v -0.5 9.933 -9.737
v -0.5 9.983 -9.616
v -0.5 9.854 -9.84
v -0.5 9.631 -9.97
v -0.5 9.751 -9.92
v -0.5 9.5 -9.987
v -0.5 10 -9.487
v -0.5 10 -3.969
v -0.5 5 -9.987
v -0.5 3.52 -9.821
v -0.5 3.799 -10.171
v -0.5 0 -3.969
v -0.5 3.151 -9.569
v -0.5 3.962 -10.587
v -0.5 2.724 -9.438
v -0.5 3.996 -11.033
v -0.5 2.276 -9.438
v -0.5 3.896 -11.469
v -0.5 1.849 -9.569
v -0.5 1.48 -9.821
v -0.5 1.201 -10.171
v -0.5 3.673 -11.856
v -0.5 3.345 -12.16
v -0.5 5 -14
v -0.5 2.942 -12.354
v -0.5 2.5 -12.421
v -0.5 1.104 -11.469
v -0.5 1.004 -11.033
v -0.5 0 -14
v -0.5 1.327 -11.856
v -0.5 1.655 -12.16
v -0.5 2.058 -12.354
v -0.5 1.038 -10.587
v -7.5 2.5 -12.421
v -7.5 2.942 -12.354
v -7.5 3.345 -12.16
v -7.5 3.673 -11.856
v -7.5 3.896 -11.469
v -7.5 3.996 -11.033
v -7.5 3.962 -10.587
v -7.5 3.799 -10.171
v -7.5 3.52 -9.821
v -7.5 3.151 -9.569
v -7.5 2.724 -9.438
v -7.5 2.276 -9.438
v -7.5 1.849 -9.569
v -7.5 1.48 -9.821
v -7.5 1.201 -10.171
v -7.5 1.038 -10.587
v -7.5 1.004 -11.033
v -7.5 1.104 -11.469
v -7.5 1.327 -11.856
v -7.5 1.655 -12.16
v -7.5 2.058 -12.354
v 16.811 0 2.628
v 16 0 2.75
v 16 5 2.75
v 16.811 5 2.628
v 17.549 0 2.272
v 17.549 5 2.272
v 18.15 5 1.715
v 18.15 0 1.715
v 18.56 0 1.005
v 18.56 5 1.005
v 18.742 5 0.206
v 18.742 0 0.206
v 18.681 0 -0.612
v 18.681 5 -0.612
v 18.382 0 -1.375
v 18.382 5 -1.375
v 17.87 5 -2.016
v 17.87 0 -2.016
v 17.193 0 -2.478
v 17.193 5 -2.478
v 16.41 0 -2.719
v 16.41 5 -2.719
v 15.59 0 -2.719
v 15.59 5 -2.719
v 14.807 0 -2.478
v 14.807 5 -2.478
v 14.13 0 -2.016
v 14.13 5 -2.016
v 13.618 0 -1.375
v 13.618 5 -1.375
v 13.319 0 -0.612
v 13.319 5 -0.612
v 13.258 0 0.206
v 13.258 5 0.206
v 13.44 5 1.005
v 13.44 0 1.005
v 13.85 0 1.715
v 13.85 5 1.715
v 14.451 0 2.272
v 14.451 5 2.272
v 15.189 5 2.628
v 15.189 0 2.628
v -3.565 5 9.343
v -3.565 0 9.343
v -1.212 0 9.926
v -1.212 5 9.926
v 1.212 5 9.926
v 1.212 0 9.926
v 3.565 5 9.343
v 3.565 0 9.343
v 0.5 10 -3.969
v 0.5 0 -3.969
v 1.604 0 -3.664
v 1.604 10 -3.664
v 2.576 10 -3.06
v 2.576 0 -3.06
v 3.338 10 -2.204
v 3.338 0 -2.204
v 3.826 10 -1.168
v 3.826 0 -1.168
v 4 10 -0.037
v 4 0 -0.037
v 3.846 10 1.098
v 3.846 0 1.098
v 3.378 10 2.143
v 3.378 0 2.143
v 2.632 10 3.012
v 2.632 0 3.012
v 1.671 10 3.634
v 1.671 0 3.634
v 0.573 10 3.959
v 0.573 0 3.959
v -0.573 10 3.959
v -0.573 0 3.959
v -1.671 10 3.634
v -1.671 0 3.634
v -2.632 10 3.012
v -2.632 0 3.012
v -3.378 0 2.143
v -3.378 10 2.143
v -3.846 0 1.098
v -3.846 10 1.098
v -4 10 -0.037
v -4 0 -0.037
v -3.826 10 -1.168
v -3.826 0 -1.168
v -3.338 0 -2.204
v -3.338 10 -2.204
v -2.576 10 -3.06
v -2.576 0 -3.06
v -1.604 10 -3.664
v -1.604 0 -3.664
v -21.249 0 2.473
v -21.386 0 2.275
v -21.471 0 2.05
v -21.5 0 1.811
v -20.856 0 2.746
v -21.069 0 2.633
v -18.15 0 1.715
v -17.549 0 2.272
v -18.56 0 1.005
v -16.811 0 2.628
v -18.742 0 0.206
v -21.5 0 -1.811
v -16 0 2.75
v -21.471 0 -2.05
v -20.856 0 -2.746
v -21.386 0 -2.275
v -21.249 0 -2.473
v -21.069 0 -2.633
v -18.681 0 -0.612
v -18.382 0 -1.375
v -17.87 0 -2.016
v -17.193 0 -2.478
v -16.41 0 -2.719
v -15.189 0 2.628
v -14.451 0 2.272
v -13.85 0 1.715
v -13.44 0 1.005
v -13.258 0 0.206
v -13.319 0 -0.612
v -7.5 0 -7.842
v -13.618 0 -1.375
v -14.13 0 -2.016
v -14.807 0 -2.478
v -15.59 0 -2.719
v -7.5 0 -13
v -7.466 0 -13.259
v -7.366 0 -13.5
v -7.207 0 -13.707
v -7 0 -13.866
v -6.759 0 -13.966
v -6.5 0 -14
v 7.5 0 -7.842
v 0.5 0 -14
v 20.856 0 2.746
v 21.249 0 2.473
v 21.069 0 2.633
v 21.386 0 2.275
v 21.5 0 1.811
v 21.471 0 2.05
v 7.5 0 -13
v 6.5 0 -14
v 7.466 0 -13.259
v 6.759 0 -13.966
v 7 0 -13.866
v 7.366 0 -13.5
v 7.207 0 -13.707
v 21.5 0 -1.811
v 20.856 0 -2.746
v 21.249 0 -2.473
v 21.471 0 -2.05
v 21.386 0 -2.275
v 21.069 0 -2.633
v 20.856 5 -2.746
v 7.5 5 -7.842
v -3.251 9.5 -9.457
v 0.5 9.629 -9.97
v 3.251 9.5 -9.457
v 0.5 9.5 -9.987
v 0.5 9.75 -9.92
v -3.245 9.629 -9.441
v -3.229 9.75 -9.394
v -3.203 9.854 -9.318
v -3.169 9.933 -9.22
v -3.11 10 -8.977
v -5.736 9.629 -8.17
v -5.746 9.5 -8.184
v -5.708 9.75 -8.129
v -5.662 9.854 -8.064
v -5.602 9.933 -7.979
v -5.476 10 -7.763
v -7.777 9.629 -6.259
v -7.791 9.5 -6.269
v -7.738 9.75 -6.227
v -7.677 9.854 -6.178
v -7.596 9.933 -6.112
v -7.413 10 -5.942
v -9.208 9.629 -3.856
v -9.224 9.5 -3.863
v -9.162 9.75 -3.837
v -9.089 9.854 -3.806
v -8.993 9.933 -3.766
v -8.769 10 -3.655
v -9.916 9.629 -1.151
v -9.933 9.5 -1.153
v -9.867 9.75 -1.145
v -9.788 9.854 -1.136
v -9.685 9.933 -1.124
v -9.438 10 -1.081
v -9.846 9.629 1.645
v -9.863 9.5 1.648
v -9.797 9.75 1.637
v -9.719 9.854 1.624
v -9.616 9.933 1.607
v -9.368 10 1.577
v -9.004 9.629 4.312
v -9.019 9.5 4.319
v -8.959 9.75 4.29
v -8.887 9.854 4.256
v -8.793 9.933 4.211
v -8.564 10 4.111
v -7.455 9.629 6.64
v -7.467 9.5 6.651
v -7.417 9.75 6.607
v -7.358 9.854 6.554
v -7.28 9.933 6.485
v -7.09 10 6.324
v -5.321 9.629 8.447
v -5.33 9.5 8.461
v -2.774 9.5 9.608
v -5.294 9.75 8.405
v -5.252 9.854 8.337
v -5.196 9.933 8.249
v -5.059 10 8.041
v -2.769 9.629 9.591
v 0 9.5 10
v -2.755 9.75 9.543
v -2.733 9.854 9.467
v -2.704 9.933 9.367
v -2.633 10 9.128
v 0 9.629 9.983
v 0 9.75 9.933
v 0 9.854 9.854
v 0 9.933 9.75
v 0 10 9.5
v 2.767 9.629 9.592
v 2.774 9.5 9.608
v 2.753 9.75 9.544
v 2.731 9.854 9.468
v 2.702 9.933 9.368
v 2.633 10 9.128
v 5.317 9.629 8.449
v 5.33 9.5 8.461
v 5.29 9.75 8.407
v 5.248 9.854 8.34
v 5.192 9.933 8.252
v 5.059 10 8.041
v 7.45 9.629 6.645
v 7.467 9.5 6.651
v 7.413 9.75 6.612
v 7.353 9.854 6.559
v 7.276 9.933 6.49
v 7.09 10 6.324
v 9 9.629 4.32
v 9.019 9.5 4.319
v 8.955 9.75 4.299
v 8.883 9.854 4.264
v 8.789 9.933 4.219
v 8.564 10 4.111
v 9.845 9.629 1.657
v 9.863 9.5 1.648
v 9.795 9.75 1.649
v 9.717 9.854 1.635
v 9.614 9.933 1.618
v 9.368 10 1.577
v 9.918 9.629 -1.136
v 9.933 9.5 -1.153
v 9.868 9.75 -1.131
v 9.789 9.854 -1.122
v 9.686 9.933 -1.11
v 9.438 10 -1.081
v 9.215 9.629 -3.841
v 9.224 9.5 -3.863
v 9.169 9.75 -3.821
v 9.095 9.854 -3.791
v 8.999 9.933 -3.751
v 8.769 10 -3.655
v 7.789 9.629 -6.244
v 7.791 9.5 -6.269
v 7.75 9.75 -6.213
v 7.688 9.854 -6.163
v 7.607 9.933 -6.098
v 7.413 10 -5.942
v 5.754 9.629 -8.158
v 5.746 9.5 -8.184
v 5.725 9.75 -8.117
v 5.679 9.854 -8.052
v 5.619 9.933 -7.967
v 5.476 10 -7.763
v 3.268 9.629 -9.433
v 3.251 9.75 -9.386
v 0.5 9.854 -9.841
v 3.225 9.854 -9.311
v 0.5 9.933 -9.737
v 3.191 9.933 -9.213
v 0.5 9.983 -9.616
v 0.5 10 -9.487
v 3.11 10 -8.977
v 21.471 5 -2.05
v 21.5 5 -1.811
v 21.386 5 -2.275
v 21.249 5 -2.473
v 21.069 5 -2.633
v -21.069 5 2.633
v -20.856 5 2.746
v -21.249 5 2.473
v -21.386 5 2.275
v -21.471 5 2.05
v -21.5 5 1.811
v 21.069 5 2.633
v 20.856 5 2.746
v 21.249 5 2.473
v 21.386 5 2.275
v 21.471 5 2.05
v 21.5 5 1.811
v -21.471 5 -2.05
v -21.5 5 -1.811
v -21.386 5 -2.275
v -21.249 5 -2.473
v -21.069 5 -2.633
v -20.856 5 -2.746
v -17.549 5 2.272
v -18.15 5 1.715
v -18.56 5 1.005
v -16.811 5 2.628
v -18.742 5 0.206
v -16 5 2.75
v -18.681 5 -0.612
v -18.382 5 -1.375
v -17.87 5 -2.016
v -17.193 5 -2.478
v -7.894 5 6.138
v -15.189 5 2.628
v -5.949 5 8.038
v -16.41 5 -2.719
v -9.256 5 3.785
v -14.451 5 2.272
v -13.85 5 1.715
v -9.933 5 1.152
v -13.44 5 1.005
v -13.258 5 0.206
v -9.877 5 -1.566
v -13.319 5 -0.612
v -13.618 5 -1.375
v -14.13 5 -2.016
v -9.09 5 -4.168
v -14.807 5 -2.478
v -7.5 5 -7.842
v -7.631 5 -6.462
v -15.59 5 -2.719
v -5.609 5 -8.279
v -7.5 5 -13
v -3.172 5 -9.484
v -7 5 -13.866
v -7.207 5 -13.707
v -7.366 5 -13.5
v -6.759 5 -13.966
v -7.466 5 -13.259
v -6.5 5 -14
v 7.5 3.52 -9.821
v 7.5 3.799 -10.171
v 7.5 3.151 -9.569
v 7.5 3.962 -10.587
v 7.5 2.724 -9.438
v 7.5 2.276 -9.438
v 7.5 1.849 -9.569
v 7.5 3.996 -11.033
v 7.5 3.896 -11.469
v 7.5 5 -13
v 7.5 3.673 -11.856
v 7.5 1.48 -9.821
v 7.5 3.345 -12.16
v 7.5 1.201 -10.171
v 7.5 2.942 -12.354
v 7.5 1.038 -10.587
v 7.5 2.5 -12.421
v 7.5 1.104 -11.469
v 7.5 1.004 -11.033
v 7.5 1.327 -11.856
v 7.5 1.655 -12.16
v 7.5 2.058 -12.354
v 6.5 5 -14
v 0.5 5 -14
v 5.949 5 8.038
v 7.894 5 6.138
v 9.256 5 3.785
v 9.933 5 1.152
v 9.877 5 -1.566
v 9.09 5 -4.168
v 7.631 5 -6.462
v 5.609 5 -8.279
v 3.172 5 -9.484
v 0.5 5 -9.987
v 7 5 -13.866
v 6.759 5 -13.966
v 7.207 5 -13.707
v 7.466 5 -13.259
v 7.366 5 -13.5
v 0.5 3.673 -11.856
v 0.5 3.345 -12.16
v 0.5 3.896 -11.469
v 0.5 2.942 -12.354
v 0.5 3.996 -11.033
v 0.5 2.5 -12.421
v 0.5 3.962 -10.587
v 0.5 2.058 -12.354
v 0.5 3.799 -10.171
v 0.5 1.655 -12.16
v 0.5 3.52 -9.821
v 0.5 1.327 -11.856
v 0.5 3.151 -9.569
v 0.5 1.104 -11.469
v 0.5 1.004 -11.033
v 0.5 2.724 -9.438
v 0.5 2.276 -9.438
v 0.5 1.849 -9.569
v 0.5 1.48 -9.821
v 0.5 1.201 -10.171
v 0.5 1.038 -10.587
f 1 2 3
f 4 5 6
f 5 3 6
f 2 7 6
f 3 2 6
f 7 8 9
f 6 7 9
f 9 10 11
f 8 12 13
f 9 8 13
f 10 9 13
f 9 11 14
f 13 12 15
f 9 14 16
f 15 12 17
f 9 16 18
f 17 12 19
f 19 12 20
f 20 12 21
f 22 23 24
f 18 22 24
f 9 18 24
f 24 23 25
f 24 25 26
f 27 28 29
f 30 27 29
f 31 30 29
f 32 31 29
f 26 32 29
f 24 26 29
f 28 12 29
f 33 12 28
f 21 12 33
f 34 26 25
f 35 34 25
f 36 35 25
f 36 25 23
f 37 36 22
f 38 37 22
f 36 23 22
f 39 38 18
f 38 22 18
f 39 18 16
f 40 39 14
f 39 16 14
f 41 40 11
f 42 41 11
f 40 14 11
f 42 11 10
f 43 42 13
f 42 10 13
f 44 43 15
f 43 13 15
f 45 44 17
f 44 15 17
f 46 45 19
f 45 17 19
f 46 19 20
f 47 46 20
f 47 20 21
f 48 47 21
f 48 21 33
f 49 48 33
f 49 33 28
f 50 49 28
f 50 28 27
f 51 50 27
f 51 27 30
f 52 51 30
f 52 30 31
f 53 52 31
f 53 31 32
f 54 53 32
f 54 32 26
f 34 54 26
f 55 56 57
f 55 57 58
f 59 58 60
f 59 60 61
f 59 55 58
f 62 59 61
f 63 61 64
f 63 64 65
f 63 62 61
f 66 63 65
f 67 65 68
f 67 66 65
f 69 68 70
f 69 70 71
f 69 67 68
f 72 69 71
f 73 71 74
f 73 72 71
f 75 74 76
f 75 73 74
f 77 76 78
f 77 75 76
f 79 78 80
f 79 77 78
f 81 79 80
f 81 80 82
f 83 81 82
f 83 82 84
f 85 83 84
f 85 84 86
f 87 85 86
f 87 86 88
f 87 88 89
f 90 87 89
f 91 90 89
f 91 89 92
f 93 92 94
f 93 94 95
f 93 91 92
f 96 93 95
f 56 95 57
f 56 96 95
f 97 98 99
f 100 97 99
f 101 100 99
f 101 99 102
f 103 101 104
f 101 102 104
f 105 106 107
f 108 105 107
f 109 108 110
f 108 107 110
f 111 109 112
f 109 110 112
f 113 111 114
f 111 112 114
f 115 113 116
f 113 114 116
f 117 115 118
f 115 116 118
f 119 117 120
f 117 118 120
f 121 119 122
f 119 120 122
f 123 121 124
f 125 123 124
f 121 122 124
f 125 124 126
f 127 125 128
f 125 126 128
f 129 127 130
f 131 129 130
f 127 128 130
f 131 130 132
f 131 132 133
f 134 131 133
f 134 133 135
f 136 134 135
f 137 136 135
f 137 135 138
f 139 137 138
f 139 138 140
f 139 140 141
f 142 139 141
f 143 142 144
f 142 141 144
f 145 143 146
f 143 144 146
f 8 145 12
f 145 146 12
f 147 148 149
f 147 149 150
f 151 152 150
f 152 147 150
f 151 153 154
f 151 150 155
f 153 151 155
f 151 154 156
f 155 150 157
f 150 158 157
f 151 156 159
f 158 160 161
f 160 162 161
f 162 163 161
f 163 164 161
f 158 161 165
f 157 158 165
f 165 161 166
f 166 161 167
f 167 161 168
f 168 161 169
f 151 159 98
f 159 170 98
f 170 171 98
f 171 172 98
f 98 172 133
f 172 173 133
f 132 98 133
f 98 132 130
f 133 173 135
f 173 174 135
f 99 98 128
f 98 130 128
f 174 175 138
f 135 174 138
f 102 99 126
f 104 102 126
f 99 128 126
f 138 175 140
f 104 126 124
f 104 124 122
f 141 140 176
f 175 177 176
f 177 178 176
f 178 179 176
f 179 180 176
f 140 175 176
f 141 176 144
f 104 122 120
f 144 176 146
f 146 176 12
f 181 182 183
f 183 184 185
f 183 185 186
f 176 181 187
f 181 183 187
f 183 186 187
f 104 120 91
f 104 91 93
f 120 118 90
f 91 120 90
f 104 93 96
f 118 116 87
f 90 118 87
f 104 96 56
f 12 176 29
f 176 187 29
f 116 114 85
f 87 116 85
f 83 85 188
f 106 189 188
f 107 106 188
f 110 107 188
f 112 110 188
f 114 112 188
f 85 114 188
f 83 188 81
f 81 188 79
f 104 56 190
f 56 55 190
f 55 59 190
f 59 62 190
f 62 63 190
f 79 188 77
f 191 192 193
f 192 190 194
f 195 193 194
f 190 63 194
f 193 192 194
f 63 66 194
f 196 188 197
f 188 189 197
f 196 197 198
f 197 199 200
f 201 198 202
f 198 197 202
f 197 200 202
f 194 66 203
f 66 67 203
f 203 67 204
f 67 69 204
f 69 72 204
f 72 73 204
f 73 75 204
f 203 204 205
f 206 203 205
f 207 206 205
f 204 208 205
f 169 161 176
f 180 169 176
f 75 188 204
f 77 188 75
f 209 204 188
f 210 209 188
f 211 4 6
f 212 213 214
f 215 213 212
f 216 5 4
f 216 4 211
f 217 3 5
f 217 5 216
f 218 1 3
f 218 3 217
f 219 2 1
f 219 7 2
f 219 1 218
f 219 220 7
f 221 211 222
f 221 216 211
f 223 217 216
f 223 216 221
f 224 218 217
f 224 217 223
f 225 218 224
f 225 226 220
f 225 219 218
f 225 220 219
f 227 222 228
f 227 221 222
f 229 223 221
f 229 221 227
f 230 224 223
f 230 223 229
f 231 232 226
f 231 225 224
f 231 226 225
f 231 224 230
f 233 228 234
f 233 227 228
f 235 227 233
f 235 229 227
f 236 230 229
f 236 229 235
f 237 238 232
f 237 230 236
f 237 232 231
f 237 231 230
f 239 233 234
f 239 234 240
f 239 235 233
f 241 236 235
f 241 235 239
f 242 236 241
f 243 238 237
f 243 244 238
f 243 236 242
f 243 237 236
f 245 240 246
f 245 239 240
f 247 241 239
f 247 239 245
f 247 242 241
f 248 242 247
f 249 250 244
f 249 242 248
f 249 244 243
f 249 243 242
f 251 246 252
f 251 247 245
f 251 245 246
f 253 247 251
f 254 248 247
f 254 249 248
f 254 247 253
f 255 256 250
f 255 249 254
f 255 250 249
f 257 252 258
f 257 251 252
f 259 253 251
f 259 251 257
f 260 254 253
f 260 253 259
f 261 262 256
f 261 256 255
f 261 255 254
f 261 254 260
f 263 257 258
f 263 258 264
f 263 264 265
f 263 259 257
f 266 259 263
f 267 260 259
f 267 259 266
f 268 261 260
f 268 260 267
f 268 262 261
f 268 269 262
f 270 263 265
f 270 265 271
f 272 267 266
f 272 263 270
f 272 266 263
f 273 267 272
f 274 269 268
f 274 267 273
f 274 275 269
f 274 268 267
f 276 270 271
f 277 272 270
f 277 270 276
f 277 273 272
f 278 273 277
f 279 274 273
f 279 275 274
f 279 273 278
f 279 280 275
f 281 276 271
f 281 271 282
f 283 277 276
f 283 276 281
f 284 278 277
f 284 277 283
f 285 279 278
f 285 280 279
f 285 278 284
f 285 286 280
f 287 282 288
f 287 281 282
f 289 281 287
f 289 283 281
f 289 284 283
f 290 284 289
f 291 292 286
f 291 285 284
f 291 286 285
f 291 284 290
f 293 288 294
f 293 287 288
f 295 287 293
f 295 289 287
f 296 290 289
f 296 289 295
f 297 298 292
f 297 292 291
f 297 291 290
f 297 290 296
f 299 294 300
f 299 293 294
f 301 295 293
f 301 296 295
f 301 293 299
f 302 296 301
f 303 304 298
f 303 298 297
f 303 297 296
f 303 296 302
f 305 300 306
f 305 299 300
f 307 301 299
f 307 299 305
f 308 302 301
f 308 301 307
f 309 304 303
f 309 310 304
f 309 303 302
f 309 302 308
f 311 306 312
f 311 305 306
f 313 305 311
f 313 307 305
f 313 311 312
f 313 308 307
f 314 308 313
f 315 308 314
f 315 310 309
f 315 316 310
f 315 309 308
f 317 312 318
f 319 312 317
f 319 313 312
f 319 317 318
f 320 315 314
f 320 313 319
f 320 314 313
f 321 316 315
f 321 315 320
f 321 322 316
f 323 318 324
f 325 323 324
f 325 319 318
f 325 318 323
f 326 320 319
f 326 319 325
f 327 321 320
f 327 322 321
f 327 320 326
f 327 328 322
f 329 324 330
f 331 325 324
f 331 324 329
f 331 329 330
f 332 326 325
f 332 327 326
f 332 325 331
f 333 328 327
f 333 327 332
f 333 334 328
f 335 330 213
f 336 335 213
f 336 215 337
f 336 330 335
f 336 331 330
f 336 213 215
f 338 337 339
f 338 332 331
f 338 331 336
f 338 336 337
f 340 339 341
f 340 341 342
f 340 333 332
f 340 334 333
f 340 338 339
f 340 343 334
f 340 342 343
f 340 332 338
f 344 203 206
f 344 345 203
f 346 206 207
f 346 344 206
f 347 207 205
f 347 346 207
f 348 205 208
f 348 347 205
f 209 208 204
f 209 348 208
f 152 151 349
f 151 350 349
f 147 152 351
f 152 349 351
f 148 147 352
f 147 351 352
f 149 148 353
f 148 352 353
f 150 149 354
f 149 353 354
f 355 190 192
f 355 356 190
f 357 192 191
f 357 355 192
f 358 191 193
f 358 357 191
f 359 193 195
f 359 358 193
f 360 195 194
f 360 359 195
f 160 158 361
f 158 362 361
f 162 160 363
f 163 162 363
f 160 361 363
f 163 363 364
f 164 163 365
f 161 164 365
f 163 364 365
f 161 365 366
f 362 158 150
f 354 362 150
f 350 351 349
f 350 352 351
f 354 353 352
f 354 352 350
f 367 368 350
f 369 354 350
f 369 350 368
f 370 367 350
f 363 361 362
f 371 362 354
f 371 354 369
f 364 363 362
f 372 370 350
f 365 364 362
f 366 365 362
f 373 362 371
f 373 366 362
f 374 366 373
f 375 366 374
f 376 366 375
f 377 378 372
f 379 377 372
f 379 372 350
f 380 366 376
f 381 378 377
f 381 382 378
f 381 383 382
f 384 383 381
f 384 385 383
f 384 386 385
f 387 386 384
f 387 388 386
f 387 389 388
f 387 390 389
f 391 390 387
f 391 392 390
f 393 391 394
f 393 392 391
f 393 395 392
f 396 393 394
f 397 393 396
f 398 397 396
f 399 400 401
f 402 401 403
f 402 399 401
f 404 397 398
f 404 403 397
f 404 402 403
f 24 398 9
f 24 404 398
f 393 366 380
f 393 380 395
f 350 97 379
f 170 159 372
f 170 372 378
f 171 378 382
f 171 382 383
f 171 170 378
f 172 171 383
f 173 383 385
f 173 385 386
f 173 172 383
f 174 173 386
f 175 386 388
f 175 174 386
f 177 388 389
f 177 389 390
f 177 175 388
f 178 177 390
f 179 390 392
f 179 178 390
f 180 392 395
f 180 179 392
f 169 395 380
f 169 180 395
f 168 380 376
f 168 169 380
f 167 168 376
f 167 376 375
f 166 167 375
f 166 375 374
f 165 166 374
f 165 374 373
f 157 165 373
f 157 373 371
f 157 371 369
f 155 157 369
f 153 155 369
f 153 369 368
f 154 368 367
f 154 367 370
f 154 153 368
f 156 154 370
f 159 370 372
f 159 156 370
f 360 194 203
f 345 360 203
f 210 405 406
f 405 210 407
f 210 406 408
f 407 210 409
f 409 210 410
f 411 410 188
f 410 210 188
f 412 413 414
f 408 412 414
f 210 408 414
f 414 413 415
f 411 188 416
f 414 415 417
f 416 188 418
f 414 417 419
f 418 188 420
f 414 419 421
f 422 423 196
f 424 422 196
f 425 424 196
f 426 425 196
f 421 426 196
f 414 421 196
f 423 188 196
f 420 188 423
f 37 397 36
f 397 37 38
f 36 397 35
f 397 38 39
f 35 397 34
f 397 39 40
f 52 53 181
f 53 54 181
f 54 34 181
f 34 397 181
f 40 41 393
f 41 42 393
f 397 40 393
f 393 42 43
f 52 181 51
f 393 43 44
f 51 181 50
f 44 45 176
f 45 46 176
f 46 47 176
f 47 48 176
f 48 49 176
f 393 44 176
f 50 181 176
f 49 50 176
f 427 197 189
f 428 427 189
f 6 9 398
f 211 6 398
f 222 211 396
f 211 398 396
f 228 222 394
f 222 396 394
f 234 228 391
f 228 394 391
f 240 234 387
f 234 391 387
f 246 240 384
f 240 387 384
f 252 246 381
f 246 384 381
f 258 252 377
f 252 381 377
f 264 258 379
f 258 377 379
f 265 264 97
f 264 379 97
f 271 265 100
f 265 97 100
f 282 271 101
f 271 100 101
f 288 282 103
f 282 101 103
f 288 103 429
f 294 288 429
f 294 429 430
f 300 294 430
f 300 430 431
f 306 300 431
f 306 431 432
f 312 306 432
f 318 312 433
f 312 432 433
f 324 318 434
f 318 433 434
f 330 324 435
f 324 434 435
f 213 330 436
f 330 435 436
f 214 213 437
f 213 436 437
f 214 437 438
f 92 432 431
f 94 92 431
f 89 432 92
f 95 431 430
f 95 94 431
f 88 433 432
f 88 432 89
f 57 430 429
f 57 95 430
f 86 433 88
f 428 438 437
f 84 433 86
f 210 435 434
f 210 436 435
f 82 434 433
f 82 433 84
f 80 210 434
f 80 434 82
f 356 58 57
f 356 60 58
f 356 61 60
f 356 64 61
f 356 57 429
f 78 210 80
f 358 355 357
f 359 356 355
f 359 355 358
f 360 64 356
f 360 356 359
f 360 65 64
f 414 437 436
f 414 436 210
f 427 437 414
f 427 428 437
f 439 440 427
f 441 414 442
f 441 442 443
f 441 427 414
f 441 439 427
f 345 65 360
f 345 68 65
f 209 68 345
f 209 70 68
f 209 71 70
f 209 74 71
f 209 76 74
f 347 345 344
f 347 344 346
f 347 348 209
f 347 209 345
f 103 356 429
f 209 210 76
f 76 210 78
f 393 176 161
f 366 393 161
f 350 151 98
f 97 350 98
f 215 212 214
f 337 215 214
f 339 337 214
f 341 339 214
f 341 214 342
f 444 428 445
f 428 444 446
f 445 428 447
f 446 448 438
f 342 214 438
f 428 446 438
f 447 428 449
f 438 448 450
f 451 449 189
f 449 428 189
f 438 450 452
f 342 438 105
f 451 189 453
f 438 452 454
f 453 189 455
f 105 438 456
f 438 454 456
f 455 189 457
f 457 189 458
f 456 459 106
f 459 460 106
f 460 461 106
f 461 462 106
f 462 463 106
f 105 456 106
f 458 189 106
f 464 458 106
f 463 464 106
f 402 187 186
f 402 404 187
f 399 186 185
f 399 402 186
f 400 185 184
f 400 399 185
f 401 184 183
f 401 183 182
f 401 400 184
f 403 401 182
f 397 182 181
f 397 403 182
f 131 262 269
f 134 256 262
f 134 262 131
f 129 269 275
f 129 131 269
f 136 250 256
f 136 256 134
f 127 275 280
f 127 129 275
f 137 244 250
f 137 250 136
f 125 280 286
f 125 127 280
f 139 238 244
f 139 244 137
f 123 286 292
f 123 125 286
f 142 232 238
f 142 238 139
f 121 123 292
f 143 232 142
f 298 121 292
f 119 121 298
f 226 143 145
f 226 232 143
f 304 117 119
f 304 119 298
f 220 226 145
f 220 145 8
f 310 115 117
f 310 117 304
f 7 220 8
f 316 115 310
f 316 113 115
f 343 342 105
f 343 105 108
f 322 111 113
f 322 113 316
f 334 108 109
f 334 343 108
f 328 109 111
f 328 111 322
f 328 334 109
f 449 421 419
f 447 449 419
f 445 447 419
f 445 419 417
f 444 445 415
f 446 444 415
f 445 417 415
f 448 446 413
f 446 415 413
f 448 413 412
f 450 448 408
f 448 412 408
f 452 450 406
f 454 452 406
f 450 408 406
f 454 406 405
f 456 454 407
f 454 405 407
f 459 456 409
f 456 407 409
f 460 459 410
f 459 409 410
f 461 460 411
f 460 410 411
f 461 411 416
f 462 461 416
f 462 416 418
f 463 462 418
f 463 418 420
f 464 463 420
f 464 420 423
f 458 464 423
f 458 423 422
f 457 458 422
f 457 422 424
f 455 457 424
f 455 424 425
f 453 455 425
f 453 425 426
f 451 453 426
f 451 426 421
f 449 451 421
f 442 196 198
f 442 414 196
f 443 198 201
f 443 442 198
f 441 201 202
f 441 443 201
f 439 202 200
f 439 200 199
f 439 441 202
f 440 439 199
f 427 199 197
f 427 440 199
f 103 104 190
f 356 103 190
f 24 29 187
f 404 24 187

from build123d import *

# Parameters (mm, degrees)
SKETCH1_R           = 2.75
BOSS_EXTRUDE1_DEPTH = 5
BOSS_EXTRUDE2_DEPTH = 5
RADYUS2_R           = 0.5
RADYUS3_R           = 1
RADYUS4_R           = 1
SKETCH3_R           = 1.5
CUT_EXTRUDE1_DEPTH  = 34.719430671
RADYUS5_R           = 1


with BuildPart() as part:
    # Sketch1 → Boss-Extrude1 (new body)
    with BuildSketch(Plane(origin=(0, 0, 0), x_dir=(1, 0, 0), z_dir=(0, 1, 0))):
        with BuildLine():
            Line((-21.5, 2.5), (-21.5, -2.5))
            Line((-21.5, -2.5), (-3.564762336, -9.343043909))
            ThreePointArc((-3.564762336, -9.343043909), (0, -10), (3.564762336, -9.343043909))
            Line((3.564762336, -9.343043909), (21.5, -2.5))
            Line((21.5, -2.5), (21.5, 2.5))
            Line((21.5, 2.5), (7.5, 7.841586018))
            Line((7.5, 7.841586018), (7.5, 14))
            Line((7.5, 14), (0.5, 14))
            Line((0.5, 14), (0.5, 9.987492178))
            Line((0.5, 9.987492178), (0.5, 3.968626967))
            ThreePointArc((0.5, 3.968626967), (0, -4), (-0.5, 3.968626967))
            Line((-0.5, 3.968626967), (-0.5, 9.987492178))
            Line((-0.5, 9.987492178), (-0.5, 14))
            Line((-0.5, 14), (-7.5, 14))
            Line((-7.5, 14), (-7.5, 7.841586018))
            Line((-7.5, 7.841586018), (-21.5, 2.5))
        make_face()
        with Locations(Location((-16, 0, 0), (0, 0, 270))):
            Circle(SKETCH1_R, mode=Mode.SUBTRACT)
        with Locations(Location((16, 0, 0), (0, 0, 270))):
            Circle(SKETCH1_R, mode=Mode.SUBTRACT)
    extrude(amount=BOSS_EXTRUDE1_DEPTH)

    # Sketch2 → Boss-Extrude2 (add)
    with BuildSketch(Plane(origin=(0, 5, 0), x_dir=(1, 0, 0), z_dir=(0, 1, 0))):
        with BuildLine():
            Line((-0.5, 3.968626967), (-0.5, 9.987492178))
            ThreePointArc((-0.5, 9.987492178), (0, -10), (0.5, 9.987492178))
            Line((0.5, 9.987492178), (0.5, 3.968626967))
            ThreePointArc((0.5, 3.968626967), (0, -4), (-0.5, 3.968626967))
        make_face()
    extrude(amount=BOSS_EXTRUDE2_DEPTH)

    # Radyus2
    radyus2_edges = [part.edges().sort_by_distance(p)[0] for p in [
        (0, 10, 10),
    ]]
    fillet(radyus2_edges, radius=RADYUS2_R)

    # Radyus3
    radyus3_edges = [part.edges().sort_by_distance(p)[0] for p in [
        (21.5, 2.5, 2.5),
    ]]
    fillet(radyus3_edges, radius=RADYUS3_R)

    # Radyus4
    radyus4_edges = [part.edges().sort_by_distance(p)[0] for p in [
        (-21.5, 2.5, -2.5),
        (-21.5, 2.5, 2.5),
        (21.5, 2.5, -2.5),
    ]]
    fillet(radyus4_edges, radius=RADYUS4_R)

    # Sketch3 → Cut-Extrude1 (cut, through all)
    with BuildSketch(Plane(origin=(7.5, 0, 0), x_dir=(0, 0, -1), z_dir=(1, 0, 0))):
        with Locations((10.920793009, 2.5)):
            Circle(SKETCH3_R)
    extrude(amount=-CUT_EXTRUDE1_DEPTH, mode=Mode.SUBTRACT)

    # Radyus5
    radyus5_edges = [part.edges().sort_by_distance(p)[0] for p in [
        (7.5, 2.5, -14),
        (-7.5, 2.5, -14),
    ]]
    fillet(radyus5_edges, radius=RADYUS5_R)


solid = part.part
